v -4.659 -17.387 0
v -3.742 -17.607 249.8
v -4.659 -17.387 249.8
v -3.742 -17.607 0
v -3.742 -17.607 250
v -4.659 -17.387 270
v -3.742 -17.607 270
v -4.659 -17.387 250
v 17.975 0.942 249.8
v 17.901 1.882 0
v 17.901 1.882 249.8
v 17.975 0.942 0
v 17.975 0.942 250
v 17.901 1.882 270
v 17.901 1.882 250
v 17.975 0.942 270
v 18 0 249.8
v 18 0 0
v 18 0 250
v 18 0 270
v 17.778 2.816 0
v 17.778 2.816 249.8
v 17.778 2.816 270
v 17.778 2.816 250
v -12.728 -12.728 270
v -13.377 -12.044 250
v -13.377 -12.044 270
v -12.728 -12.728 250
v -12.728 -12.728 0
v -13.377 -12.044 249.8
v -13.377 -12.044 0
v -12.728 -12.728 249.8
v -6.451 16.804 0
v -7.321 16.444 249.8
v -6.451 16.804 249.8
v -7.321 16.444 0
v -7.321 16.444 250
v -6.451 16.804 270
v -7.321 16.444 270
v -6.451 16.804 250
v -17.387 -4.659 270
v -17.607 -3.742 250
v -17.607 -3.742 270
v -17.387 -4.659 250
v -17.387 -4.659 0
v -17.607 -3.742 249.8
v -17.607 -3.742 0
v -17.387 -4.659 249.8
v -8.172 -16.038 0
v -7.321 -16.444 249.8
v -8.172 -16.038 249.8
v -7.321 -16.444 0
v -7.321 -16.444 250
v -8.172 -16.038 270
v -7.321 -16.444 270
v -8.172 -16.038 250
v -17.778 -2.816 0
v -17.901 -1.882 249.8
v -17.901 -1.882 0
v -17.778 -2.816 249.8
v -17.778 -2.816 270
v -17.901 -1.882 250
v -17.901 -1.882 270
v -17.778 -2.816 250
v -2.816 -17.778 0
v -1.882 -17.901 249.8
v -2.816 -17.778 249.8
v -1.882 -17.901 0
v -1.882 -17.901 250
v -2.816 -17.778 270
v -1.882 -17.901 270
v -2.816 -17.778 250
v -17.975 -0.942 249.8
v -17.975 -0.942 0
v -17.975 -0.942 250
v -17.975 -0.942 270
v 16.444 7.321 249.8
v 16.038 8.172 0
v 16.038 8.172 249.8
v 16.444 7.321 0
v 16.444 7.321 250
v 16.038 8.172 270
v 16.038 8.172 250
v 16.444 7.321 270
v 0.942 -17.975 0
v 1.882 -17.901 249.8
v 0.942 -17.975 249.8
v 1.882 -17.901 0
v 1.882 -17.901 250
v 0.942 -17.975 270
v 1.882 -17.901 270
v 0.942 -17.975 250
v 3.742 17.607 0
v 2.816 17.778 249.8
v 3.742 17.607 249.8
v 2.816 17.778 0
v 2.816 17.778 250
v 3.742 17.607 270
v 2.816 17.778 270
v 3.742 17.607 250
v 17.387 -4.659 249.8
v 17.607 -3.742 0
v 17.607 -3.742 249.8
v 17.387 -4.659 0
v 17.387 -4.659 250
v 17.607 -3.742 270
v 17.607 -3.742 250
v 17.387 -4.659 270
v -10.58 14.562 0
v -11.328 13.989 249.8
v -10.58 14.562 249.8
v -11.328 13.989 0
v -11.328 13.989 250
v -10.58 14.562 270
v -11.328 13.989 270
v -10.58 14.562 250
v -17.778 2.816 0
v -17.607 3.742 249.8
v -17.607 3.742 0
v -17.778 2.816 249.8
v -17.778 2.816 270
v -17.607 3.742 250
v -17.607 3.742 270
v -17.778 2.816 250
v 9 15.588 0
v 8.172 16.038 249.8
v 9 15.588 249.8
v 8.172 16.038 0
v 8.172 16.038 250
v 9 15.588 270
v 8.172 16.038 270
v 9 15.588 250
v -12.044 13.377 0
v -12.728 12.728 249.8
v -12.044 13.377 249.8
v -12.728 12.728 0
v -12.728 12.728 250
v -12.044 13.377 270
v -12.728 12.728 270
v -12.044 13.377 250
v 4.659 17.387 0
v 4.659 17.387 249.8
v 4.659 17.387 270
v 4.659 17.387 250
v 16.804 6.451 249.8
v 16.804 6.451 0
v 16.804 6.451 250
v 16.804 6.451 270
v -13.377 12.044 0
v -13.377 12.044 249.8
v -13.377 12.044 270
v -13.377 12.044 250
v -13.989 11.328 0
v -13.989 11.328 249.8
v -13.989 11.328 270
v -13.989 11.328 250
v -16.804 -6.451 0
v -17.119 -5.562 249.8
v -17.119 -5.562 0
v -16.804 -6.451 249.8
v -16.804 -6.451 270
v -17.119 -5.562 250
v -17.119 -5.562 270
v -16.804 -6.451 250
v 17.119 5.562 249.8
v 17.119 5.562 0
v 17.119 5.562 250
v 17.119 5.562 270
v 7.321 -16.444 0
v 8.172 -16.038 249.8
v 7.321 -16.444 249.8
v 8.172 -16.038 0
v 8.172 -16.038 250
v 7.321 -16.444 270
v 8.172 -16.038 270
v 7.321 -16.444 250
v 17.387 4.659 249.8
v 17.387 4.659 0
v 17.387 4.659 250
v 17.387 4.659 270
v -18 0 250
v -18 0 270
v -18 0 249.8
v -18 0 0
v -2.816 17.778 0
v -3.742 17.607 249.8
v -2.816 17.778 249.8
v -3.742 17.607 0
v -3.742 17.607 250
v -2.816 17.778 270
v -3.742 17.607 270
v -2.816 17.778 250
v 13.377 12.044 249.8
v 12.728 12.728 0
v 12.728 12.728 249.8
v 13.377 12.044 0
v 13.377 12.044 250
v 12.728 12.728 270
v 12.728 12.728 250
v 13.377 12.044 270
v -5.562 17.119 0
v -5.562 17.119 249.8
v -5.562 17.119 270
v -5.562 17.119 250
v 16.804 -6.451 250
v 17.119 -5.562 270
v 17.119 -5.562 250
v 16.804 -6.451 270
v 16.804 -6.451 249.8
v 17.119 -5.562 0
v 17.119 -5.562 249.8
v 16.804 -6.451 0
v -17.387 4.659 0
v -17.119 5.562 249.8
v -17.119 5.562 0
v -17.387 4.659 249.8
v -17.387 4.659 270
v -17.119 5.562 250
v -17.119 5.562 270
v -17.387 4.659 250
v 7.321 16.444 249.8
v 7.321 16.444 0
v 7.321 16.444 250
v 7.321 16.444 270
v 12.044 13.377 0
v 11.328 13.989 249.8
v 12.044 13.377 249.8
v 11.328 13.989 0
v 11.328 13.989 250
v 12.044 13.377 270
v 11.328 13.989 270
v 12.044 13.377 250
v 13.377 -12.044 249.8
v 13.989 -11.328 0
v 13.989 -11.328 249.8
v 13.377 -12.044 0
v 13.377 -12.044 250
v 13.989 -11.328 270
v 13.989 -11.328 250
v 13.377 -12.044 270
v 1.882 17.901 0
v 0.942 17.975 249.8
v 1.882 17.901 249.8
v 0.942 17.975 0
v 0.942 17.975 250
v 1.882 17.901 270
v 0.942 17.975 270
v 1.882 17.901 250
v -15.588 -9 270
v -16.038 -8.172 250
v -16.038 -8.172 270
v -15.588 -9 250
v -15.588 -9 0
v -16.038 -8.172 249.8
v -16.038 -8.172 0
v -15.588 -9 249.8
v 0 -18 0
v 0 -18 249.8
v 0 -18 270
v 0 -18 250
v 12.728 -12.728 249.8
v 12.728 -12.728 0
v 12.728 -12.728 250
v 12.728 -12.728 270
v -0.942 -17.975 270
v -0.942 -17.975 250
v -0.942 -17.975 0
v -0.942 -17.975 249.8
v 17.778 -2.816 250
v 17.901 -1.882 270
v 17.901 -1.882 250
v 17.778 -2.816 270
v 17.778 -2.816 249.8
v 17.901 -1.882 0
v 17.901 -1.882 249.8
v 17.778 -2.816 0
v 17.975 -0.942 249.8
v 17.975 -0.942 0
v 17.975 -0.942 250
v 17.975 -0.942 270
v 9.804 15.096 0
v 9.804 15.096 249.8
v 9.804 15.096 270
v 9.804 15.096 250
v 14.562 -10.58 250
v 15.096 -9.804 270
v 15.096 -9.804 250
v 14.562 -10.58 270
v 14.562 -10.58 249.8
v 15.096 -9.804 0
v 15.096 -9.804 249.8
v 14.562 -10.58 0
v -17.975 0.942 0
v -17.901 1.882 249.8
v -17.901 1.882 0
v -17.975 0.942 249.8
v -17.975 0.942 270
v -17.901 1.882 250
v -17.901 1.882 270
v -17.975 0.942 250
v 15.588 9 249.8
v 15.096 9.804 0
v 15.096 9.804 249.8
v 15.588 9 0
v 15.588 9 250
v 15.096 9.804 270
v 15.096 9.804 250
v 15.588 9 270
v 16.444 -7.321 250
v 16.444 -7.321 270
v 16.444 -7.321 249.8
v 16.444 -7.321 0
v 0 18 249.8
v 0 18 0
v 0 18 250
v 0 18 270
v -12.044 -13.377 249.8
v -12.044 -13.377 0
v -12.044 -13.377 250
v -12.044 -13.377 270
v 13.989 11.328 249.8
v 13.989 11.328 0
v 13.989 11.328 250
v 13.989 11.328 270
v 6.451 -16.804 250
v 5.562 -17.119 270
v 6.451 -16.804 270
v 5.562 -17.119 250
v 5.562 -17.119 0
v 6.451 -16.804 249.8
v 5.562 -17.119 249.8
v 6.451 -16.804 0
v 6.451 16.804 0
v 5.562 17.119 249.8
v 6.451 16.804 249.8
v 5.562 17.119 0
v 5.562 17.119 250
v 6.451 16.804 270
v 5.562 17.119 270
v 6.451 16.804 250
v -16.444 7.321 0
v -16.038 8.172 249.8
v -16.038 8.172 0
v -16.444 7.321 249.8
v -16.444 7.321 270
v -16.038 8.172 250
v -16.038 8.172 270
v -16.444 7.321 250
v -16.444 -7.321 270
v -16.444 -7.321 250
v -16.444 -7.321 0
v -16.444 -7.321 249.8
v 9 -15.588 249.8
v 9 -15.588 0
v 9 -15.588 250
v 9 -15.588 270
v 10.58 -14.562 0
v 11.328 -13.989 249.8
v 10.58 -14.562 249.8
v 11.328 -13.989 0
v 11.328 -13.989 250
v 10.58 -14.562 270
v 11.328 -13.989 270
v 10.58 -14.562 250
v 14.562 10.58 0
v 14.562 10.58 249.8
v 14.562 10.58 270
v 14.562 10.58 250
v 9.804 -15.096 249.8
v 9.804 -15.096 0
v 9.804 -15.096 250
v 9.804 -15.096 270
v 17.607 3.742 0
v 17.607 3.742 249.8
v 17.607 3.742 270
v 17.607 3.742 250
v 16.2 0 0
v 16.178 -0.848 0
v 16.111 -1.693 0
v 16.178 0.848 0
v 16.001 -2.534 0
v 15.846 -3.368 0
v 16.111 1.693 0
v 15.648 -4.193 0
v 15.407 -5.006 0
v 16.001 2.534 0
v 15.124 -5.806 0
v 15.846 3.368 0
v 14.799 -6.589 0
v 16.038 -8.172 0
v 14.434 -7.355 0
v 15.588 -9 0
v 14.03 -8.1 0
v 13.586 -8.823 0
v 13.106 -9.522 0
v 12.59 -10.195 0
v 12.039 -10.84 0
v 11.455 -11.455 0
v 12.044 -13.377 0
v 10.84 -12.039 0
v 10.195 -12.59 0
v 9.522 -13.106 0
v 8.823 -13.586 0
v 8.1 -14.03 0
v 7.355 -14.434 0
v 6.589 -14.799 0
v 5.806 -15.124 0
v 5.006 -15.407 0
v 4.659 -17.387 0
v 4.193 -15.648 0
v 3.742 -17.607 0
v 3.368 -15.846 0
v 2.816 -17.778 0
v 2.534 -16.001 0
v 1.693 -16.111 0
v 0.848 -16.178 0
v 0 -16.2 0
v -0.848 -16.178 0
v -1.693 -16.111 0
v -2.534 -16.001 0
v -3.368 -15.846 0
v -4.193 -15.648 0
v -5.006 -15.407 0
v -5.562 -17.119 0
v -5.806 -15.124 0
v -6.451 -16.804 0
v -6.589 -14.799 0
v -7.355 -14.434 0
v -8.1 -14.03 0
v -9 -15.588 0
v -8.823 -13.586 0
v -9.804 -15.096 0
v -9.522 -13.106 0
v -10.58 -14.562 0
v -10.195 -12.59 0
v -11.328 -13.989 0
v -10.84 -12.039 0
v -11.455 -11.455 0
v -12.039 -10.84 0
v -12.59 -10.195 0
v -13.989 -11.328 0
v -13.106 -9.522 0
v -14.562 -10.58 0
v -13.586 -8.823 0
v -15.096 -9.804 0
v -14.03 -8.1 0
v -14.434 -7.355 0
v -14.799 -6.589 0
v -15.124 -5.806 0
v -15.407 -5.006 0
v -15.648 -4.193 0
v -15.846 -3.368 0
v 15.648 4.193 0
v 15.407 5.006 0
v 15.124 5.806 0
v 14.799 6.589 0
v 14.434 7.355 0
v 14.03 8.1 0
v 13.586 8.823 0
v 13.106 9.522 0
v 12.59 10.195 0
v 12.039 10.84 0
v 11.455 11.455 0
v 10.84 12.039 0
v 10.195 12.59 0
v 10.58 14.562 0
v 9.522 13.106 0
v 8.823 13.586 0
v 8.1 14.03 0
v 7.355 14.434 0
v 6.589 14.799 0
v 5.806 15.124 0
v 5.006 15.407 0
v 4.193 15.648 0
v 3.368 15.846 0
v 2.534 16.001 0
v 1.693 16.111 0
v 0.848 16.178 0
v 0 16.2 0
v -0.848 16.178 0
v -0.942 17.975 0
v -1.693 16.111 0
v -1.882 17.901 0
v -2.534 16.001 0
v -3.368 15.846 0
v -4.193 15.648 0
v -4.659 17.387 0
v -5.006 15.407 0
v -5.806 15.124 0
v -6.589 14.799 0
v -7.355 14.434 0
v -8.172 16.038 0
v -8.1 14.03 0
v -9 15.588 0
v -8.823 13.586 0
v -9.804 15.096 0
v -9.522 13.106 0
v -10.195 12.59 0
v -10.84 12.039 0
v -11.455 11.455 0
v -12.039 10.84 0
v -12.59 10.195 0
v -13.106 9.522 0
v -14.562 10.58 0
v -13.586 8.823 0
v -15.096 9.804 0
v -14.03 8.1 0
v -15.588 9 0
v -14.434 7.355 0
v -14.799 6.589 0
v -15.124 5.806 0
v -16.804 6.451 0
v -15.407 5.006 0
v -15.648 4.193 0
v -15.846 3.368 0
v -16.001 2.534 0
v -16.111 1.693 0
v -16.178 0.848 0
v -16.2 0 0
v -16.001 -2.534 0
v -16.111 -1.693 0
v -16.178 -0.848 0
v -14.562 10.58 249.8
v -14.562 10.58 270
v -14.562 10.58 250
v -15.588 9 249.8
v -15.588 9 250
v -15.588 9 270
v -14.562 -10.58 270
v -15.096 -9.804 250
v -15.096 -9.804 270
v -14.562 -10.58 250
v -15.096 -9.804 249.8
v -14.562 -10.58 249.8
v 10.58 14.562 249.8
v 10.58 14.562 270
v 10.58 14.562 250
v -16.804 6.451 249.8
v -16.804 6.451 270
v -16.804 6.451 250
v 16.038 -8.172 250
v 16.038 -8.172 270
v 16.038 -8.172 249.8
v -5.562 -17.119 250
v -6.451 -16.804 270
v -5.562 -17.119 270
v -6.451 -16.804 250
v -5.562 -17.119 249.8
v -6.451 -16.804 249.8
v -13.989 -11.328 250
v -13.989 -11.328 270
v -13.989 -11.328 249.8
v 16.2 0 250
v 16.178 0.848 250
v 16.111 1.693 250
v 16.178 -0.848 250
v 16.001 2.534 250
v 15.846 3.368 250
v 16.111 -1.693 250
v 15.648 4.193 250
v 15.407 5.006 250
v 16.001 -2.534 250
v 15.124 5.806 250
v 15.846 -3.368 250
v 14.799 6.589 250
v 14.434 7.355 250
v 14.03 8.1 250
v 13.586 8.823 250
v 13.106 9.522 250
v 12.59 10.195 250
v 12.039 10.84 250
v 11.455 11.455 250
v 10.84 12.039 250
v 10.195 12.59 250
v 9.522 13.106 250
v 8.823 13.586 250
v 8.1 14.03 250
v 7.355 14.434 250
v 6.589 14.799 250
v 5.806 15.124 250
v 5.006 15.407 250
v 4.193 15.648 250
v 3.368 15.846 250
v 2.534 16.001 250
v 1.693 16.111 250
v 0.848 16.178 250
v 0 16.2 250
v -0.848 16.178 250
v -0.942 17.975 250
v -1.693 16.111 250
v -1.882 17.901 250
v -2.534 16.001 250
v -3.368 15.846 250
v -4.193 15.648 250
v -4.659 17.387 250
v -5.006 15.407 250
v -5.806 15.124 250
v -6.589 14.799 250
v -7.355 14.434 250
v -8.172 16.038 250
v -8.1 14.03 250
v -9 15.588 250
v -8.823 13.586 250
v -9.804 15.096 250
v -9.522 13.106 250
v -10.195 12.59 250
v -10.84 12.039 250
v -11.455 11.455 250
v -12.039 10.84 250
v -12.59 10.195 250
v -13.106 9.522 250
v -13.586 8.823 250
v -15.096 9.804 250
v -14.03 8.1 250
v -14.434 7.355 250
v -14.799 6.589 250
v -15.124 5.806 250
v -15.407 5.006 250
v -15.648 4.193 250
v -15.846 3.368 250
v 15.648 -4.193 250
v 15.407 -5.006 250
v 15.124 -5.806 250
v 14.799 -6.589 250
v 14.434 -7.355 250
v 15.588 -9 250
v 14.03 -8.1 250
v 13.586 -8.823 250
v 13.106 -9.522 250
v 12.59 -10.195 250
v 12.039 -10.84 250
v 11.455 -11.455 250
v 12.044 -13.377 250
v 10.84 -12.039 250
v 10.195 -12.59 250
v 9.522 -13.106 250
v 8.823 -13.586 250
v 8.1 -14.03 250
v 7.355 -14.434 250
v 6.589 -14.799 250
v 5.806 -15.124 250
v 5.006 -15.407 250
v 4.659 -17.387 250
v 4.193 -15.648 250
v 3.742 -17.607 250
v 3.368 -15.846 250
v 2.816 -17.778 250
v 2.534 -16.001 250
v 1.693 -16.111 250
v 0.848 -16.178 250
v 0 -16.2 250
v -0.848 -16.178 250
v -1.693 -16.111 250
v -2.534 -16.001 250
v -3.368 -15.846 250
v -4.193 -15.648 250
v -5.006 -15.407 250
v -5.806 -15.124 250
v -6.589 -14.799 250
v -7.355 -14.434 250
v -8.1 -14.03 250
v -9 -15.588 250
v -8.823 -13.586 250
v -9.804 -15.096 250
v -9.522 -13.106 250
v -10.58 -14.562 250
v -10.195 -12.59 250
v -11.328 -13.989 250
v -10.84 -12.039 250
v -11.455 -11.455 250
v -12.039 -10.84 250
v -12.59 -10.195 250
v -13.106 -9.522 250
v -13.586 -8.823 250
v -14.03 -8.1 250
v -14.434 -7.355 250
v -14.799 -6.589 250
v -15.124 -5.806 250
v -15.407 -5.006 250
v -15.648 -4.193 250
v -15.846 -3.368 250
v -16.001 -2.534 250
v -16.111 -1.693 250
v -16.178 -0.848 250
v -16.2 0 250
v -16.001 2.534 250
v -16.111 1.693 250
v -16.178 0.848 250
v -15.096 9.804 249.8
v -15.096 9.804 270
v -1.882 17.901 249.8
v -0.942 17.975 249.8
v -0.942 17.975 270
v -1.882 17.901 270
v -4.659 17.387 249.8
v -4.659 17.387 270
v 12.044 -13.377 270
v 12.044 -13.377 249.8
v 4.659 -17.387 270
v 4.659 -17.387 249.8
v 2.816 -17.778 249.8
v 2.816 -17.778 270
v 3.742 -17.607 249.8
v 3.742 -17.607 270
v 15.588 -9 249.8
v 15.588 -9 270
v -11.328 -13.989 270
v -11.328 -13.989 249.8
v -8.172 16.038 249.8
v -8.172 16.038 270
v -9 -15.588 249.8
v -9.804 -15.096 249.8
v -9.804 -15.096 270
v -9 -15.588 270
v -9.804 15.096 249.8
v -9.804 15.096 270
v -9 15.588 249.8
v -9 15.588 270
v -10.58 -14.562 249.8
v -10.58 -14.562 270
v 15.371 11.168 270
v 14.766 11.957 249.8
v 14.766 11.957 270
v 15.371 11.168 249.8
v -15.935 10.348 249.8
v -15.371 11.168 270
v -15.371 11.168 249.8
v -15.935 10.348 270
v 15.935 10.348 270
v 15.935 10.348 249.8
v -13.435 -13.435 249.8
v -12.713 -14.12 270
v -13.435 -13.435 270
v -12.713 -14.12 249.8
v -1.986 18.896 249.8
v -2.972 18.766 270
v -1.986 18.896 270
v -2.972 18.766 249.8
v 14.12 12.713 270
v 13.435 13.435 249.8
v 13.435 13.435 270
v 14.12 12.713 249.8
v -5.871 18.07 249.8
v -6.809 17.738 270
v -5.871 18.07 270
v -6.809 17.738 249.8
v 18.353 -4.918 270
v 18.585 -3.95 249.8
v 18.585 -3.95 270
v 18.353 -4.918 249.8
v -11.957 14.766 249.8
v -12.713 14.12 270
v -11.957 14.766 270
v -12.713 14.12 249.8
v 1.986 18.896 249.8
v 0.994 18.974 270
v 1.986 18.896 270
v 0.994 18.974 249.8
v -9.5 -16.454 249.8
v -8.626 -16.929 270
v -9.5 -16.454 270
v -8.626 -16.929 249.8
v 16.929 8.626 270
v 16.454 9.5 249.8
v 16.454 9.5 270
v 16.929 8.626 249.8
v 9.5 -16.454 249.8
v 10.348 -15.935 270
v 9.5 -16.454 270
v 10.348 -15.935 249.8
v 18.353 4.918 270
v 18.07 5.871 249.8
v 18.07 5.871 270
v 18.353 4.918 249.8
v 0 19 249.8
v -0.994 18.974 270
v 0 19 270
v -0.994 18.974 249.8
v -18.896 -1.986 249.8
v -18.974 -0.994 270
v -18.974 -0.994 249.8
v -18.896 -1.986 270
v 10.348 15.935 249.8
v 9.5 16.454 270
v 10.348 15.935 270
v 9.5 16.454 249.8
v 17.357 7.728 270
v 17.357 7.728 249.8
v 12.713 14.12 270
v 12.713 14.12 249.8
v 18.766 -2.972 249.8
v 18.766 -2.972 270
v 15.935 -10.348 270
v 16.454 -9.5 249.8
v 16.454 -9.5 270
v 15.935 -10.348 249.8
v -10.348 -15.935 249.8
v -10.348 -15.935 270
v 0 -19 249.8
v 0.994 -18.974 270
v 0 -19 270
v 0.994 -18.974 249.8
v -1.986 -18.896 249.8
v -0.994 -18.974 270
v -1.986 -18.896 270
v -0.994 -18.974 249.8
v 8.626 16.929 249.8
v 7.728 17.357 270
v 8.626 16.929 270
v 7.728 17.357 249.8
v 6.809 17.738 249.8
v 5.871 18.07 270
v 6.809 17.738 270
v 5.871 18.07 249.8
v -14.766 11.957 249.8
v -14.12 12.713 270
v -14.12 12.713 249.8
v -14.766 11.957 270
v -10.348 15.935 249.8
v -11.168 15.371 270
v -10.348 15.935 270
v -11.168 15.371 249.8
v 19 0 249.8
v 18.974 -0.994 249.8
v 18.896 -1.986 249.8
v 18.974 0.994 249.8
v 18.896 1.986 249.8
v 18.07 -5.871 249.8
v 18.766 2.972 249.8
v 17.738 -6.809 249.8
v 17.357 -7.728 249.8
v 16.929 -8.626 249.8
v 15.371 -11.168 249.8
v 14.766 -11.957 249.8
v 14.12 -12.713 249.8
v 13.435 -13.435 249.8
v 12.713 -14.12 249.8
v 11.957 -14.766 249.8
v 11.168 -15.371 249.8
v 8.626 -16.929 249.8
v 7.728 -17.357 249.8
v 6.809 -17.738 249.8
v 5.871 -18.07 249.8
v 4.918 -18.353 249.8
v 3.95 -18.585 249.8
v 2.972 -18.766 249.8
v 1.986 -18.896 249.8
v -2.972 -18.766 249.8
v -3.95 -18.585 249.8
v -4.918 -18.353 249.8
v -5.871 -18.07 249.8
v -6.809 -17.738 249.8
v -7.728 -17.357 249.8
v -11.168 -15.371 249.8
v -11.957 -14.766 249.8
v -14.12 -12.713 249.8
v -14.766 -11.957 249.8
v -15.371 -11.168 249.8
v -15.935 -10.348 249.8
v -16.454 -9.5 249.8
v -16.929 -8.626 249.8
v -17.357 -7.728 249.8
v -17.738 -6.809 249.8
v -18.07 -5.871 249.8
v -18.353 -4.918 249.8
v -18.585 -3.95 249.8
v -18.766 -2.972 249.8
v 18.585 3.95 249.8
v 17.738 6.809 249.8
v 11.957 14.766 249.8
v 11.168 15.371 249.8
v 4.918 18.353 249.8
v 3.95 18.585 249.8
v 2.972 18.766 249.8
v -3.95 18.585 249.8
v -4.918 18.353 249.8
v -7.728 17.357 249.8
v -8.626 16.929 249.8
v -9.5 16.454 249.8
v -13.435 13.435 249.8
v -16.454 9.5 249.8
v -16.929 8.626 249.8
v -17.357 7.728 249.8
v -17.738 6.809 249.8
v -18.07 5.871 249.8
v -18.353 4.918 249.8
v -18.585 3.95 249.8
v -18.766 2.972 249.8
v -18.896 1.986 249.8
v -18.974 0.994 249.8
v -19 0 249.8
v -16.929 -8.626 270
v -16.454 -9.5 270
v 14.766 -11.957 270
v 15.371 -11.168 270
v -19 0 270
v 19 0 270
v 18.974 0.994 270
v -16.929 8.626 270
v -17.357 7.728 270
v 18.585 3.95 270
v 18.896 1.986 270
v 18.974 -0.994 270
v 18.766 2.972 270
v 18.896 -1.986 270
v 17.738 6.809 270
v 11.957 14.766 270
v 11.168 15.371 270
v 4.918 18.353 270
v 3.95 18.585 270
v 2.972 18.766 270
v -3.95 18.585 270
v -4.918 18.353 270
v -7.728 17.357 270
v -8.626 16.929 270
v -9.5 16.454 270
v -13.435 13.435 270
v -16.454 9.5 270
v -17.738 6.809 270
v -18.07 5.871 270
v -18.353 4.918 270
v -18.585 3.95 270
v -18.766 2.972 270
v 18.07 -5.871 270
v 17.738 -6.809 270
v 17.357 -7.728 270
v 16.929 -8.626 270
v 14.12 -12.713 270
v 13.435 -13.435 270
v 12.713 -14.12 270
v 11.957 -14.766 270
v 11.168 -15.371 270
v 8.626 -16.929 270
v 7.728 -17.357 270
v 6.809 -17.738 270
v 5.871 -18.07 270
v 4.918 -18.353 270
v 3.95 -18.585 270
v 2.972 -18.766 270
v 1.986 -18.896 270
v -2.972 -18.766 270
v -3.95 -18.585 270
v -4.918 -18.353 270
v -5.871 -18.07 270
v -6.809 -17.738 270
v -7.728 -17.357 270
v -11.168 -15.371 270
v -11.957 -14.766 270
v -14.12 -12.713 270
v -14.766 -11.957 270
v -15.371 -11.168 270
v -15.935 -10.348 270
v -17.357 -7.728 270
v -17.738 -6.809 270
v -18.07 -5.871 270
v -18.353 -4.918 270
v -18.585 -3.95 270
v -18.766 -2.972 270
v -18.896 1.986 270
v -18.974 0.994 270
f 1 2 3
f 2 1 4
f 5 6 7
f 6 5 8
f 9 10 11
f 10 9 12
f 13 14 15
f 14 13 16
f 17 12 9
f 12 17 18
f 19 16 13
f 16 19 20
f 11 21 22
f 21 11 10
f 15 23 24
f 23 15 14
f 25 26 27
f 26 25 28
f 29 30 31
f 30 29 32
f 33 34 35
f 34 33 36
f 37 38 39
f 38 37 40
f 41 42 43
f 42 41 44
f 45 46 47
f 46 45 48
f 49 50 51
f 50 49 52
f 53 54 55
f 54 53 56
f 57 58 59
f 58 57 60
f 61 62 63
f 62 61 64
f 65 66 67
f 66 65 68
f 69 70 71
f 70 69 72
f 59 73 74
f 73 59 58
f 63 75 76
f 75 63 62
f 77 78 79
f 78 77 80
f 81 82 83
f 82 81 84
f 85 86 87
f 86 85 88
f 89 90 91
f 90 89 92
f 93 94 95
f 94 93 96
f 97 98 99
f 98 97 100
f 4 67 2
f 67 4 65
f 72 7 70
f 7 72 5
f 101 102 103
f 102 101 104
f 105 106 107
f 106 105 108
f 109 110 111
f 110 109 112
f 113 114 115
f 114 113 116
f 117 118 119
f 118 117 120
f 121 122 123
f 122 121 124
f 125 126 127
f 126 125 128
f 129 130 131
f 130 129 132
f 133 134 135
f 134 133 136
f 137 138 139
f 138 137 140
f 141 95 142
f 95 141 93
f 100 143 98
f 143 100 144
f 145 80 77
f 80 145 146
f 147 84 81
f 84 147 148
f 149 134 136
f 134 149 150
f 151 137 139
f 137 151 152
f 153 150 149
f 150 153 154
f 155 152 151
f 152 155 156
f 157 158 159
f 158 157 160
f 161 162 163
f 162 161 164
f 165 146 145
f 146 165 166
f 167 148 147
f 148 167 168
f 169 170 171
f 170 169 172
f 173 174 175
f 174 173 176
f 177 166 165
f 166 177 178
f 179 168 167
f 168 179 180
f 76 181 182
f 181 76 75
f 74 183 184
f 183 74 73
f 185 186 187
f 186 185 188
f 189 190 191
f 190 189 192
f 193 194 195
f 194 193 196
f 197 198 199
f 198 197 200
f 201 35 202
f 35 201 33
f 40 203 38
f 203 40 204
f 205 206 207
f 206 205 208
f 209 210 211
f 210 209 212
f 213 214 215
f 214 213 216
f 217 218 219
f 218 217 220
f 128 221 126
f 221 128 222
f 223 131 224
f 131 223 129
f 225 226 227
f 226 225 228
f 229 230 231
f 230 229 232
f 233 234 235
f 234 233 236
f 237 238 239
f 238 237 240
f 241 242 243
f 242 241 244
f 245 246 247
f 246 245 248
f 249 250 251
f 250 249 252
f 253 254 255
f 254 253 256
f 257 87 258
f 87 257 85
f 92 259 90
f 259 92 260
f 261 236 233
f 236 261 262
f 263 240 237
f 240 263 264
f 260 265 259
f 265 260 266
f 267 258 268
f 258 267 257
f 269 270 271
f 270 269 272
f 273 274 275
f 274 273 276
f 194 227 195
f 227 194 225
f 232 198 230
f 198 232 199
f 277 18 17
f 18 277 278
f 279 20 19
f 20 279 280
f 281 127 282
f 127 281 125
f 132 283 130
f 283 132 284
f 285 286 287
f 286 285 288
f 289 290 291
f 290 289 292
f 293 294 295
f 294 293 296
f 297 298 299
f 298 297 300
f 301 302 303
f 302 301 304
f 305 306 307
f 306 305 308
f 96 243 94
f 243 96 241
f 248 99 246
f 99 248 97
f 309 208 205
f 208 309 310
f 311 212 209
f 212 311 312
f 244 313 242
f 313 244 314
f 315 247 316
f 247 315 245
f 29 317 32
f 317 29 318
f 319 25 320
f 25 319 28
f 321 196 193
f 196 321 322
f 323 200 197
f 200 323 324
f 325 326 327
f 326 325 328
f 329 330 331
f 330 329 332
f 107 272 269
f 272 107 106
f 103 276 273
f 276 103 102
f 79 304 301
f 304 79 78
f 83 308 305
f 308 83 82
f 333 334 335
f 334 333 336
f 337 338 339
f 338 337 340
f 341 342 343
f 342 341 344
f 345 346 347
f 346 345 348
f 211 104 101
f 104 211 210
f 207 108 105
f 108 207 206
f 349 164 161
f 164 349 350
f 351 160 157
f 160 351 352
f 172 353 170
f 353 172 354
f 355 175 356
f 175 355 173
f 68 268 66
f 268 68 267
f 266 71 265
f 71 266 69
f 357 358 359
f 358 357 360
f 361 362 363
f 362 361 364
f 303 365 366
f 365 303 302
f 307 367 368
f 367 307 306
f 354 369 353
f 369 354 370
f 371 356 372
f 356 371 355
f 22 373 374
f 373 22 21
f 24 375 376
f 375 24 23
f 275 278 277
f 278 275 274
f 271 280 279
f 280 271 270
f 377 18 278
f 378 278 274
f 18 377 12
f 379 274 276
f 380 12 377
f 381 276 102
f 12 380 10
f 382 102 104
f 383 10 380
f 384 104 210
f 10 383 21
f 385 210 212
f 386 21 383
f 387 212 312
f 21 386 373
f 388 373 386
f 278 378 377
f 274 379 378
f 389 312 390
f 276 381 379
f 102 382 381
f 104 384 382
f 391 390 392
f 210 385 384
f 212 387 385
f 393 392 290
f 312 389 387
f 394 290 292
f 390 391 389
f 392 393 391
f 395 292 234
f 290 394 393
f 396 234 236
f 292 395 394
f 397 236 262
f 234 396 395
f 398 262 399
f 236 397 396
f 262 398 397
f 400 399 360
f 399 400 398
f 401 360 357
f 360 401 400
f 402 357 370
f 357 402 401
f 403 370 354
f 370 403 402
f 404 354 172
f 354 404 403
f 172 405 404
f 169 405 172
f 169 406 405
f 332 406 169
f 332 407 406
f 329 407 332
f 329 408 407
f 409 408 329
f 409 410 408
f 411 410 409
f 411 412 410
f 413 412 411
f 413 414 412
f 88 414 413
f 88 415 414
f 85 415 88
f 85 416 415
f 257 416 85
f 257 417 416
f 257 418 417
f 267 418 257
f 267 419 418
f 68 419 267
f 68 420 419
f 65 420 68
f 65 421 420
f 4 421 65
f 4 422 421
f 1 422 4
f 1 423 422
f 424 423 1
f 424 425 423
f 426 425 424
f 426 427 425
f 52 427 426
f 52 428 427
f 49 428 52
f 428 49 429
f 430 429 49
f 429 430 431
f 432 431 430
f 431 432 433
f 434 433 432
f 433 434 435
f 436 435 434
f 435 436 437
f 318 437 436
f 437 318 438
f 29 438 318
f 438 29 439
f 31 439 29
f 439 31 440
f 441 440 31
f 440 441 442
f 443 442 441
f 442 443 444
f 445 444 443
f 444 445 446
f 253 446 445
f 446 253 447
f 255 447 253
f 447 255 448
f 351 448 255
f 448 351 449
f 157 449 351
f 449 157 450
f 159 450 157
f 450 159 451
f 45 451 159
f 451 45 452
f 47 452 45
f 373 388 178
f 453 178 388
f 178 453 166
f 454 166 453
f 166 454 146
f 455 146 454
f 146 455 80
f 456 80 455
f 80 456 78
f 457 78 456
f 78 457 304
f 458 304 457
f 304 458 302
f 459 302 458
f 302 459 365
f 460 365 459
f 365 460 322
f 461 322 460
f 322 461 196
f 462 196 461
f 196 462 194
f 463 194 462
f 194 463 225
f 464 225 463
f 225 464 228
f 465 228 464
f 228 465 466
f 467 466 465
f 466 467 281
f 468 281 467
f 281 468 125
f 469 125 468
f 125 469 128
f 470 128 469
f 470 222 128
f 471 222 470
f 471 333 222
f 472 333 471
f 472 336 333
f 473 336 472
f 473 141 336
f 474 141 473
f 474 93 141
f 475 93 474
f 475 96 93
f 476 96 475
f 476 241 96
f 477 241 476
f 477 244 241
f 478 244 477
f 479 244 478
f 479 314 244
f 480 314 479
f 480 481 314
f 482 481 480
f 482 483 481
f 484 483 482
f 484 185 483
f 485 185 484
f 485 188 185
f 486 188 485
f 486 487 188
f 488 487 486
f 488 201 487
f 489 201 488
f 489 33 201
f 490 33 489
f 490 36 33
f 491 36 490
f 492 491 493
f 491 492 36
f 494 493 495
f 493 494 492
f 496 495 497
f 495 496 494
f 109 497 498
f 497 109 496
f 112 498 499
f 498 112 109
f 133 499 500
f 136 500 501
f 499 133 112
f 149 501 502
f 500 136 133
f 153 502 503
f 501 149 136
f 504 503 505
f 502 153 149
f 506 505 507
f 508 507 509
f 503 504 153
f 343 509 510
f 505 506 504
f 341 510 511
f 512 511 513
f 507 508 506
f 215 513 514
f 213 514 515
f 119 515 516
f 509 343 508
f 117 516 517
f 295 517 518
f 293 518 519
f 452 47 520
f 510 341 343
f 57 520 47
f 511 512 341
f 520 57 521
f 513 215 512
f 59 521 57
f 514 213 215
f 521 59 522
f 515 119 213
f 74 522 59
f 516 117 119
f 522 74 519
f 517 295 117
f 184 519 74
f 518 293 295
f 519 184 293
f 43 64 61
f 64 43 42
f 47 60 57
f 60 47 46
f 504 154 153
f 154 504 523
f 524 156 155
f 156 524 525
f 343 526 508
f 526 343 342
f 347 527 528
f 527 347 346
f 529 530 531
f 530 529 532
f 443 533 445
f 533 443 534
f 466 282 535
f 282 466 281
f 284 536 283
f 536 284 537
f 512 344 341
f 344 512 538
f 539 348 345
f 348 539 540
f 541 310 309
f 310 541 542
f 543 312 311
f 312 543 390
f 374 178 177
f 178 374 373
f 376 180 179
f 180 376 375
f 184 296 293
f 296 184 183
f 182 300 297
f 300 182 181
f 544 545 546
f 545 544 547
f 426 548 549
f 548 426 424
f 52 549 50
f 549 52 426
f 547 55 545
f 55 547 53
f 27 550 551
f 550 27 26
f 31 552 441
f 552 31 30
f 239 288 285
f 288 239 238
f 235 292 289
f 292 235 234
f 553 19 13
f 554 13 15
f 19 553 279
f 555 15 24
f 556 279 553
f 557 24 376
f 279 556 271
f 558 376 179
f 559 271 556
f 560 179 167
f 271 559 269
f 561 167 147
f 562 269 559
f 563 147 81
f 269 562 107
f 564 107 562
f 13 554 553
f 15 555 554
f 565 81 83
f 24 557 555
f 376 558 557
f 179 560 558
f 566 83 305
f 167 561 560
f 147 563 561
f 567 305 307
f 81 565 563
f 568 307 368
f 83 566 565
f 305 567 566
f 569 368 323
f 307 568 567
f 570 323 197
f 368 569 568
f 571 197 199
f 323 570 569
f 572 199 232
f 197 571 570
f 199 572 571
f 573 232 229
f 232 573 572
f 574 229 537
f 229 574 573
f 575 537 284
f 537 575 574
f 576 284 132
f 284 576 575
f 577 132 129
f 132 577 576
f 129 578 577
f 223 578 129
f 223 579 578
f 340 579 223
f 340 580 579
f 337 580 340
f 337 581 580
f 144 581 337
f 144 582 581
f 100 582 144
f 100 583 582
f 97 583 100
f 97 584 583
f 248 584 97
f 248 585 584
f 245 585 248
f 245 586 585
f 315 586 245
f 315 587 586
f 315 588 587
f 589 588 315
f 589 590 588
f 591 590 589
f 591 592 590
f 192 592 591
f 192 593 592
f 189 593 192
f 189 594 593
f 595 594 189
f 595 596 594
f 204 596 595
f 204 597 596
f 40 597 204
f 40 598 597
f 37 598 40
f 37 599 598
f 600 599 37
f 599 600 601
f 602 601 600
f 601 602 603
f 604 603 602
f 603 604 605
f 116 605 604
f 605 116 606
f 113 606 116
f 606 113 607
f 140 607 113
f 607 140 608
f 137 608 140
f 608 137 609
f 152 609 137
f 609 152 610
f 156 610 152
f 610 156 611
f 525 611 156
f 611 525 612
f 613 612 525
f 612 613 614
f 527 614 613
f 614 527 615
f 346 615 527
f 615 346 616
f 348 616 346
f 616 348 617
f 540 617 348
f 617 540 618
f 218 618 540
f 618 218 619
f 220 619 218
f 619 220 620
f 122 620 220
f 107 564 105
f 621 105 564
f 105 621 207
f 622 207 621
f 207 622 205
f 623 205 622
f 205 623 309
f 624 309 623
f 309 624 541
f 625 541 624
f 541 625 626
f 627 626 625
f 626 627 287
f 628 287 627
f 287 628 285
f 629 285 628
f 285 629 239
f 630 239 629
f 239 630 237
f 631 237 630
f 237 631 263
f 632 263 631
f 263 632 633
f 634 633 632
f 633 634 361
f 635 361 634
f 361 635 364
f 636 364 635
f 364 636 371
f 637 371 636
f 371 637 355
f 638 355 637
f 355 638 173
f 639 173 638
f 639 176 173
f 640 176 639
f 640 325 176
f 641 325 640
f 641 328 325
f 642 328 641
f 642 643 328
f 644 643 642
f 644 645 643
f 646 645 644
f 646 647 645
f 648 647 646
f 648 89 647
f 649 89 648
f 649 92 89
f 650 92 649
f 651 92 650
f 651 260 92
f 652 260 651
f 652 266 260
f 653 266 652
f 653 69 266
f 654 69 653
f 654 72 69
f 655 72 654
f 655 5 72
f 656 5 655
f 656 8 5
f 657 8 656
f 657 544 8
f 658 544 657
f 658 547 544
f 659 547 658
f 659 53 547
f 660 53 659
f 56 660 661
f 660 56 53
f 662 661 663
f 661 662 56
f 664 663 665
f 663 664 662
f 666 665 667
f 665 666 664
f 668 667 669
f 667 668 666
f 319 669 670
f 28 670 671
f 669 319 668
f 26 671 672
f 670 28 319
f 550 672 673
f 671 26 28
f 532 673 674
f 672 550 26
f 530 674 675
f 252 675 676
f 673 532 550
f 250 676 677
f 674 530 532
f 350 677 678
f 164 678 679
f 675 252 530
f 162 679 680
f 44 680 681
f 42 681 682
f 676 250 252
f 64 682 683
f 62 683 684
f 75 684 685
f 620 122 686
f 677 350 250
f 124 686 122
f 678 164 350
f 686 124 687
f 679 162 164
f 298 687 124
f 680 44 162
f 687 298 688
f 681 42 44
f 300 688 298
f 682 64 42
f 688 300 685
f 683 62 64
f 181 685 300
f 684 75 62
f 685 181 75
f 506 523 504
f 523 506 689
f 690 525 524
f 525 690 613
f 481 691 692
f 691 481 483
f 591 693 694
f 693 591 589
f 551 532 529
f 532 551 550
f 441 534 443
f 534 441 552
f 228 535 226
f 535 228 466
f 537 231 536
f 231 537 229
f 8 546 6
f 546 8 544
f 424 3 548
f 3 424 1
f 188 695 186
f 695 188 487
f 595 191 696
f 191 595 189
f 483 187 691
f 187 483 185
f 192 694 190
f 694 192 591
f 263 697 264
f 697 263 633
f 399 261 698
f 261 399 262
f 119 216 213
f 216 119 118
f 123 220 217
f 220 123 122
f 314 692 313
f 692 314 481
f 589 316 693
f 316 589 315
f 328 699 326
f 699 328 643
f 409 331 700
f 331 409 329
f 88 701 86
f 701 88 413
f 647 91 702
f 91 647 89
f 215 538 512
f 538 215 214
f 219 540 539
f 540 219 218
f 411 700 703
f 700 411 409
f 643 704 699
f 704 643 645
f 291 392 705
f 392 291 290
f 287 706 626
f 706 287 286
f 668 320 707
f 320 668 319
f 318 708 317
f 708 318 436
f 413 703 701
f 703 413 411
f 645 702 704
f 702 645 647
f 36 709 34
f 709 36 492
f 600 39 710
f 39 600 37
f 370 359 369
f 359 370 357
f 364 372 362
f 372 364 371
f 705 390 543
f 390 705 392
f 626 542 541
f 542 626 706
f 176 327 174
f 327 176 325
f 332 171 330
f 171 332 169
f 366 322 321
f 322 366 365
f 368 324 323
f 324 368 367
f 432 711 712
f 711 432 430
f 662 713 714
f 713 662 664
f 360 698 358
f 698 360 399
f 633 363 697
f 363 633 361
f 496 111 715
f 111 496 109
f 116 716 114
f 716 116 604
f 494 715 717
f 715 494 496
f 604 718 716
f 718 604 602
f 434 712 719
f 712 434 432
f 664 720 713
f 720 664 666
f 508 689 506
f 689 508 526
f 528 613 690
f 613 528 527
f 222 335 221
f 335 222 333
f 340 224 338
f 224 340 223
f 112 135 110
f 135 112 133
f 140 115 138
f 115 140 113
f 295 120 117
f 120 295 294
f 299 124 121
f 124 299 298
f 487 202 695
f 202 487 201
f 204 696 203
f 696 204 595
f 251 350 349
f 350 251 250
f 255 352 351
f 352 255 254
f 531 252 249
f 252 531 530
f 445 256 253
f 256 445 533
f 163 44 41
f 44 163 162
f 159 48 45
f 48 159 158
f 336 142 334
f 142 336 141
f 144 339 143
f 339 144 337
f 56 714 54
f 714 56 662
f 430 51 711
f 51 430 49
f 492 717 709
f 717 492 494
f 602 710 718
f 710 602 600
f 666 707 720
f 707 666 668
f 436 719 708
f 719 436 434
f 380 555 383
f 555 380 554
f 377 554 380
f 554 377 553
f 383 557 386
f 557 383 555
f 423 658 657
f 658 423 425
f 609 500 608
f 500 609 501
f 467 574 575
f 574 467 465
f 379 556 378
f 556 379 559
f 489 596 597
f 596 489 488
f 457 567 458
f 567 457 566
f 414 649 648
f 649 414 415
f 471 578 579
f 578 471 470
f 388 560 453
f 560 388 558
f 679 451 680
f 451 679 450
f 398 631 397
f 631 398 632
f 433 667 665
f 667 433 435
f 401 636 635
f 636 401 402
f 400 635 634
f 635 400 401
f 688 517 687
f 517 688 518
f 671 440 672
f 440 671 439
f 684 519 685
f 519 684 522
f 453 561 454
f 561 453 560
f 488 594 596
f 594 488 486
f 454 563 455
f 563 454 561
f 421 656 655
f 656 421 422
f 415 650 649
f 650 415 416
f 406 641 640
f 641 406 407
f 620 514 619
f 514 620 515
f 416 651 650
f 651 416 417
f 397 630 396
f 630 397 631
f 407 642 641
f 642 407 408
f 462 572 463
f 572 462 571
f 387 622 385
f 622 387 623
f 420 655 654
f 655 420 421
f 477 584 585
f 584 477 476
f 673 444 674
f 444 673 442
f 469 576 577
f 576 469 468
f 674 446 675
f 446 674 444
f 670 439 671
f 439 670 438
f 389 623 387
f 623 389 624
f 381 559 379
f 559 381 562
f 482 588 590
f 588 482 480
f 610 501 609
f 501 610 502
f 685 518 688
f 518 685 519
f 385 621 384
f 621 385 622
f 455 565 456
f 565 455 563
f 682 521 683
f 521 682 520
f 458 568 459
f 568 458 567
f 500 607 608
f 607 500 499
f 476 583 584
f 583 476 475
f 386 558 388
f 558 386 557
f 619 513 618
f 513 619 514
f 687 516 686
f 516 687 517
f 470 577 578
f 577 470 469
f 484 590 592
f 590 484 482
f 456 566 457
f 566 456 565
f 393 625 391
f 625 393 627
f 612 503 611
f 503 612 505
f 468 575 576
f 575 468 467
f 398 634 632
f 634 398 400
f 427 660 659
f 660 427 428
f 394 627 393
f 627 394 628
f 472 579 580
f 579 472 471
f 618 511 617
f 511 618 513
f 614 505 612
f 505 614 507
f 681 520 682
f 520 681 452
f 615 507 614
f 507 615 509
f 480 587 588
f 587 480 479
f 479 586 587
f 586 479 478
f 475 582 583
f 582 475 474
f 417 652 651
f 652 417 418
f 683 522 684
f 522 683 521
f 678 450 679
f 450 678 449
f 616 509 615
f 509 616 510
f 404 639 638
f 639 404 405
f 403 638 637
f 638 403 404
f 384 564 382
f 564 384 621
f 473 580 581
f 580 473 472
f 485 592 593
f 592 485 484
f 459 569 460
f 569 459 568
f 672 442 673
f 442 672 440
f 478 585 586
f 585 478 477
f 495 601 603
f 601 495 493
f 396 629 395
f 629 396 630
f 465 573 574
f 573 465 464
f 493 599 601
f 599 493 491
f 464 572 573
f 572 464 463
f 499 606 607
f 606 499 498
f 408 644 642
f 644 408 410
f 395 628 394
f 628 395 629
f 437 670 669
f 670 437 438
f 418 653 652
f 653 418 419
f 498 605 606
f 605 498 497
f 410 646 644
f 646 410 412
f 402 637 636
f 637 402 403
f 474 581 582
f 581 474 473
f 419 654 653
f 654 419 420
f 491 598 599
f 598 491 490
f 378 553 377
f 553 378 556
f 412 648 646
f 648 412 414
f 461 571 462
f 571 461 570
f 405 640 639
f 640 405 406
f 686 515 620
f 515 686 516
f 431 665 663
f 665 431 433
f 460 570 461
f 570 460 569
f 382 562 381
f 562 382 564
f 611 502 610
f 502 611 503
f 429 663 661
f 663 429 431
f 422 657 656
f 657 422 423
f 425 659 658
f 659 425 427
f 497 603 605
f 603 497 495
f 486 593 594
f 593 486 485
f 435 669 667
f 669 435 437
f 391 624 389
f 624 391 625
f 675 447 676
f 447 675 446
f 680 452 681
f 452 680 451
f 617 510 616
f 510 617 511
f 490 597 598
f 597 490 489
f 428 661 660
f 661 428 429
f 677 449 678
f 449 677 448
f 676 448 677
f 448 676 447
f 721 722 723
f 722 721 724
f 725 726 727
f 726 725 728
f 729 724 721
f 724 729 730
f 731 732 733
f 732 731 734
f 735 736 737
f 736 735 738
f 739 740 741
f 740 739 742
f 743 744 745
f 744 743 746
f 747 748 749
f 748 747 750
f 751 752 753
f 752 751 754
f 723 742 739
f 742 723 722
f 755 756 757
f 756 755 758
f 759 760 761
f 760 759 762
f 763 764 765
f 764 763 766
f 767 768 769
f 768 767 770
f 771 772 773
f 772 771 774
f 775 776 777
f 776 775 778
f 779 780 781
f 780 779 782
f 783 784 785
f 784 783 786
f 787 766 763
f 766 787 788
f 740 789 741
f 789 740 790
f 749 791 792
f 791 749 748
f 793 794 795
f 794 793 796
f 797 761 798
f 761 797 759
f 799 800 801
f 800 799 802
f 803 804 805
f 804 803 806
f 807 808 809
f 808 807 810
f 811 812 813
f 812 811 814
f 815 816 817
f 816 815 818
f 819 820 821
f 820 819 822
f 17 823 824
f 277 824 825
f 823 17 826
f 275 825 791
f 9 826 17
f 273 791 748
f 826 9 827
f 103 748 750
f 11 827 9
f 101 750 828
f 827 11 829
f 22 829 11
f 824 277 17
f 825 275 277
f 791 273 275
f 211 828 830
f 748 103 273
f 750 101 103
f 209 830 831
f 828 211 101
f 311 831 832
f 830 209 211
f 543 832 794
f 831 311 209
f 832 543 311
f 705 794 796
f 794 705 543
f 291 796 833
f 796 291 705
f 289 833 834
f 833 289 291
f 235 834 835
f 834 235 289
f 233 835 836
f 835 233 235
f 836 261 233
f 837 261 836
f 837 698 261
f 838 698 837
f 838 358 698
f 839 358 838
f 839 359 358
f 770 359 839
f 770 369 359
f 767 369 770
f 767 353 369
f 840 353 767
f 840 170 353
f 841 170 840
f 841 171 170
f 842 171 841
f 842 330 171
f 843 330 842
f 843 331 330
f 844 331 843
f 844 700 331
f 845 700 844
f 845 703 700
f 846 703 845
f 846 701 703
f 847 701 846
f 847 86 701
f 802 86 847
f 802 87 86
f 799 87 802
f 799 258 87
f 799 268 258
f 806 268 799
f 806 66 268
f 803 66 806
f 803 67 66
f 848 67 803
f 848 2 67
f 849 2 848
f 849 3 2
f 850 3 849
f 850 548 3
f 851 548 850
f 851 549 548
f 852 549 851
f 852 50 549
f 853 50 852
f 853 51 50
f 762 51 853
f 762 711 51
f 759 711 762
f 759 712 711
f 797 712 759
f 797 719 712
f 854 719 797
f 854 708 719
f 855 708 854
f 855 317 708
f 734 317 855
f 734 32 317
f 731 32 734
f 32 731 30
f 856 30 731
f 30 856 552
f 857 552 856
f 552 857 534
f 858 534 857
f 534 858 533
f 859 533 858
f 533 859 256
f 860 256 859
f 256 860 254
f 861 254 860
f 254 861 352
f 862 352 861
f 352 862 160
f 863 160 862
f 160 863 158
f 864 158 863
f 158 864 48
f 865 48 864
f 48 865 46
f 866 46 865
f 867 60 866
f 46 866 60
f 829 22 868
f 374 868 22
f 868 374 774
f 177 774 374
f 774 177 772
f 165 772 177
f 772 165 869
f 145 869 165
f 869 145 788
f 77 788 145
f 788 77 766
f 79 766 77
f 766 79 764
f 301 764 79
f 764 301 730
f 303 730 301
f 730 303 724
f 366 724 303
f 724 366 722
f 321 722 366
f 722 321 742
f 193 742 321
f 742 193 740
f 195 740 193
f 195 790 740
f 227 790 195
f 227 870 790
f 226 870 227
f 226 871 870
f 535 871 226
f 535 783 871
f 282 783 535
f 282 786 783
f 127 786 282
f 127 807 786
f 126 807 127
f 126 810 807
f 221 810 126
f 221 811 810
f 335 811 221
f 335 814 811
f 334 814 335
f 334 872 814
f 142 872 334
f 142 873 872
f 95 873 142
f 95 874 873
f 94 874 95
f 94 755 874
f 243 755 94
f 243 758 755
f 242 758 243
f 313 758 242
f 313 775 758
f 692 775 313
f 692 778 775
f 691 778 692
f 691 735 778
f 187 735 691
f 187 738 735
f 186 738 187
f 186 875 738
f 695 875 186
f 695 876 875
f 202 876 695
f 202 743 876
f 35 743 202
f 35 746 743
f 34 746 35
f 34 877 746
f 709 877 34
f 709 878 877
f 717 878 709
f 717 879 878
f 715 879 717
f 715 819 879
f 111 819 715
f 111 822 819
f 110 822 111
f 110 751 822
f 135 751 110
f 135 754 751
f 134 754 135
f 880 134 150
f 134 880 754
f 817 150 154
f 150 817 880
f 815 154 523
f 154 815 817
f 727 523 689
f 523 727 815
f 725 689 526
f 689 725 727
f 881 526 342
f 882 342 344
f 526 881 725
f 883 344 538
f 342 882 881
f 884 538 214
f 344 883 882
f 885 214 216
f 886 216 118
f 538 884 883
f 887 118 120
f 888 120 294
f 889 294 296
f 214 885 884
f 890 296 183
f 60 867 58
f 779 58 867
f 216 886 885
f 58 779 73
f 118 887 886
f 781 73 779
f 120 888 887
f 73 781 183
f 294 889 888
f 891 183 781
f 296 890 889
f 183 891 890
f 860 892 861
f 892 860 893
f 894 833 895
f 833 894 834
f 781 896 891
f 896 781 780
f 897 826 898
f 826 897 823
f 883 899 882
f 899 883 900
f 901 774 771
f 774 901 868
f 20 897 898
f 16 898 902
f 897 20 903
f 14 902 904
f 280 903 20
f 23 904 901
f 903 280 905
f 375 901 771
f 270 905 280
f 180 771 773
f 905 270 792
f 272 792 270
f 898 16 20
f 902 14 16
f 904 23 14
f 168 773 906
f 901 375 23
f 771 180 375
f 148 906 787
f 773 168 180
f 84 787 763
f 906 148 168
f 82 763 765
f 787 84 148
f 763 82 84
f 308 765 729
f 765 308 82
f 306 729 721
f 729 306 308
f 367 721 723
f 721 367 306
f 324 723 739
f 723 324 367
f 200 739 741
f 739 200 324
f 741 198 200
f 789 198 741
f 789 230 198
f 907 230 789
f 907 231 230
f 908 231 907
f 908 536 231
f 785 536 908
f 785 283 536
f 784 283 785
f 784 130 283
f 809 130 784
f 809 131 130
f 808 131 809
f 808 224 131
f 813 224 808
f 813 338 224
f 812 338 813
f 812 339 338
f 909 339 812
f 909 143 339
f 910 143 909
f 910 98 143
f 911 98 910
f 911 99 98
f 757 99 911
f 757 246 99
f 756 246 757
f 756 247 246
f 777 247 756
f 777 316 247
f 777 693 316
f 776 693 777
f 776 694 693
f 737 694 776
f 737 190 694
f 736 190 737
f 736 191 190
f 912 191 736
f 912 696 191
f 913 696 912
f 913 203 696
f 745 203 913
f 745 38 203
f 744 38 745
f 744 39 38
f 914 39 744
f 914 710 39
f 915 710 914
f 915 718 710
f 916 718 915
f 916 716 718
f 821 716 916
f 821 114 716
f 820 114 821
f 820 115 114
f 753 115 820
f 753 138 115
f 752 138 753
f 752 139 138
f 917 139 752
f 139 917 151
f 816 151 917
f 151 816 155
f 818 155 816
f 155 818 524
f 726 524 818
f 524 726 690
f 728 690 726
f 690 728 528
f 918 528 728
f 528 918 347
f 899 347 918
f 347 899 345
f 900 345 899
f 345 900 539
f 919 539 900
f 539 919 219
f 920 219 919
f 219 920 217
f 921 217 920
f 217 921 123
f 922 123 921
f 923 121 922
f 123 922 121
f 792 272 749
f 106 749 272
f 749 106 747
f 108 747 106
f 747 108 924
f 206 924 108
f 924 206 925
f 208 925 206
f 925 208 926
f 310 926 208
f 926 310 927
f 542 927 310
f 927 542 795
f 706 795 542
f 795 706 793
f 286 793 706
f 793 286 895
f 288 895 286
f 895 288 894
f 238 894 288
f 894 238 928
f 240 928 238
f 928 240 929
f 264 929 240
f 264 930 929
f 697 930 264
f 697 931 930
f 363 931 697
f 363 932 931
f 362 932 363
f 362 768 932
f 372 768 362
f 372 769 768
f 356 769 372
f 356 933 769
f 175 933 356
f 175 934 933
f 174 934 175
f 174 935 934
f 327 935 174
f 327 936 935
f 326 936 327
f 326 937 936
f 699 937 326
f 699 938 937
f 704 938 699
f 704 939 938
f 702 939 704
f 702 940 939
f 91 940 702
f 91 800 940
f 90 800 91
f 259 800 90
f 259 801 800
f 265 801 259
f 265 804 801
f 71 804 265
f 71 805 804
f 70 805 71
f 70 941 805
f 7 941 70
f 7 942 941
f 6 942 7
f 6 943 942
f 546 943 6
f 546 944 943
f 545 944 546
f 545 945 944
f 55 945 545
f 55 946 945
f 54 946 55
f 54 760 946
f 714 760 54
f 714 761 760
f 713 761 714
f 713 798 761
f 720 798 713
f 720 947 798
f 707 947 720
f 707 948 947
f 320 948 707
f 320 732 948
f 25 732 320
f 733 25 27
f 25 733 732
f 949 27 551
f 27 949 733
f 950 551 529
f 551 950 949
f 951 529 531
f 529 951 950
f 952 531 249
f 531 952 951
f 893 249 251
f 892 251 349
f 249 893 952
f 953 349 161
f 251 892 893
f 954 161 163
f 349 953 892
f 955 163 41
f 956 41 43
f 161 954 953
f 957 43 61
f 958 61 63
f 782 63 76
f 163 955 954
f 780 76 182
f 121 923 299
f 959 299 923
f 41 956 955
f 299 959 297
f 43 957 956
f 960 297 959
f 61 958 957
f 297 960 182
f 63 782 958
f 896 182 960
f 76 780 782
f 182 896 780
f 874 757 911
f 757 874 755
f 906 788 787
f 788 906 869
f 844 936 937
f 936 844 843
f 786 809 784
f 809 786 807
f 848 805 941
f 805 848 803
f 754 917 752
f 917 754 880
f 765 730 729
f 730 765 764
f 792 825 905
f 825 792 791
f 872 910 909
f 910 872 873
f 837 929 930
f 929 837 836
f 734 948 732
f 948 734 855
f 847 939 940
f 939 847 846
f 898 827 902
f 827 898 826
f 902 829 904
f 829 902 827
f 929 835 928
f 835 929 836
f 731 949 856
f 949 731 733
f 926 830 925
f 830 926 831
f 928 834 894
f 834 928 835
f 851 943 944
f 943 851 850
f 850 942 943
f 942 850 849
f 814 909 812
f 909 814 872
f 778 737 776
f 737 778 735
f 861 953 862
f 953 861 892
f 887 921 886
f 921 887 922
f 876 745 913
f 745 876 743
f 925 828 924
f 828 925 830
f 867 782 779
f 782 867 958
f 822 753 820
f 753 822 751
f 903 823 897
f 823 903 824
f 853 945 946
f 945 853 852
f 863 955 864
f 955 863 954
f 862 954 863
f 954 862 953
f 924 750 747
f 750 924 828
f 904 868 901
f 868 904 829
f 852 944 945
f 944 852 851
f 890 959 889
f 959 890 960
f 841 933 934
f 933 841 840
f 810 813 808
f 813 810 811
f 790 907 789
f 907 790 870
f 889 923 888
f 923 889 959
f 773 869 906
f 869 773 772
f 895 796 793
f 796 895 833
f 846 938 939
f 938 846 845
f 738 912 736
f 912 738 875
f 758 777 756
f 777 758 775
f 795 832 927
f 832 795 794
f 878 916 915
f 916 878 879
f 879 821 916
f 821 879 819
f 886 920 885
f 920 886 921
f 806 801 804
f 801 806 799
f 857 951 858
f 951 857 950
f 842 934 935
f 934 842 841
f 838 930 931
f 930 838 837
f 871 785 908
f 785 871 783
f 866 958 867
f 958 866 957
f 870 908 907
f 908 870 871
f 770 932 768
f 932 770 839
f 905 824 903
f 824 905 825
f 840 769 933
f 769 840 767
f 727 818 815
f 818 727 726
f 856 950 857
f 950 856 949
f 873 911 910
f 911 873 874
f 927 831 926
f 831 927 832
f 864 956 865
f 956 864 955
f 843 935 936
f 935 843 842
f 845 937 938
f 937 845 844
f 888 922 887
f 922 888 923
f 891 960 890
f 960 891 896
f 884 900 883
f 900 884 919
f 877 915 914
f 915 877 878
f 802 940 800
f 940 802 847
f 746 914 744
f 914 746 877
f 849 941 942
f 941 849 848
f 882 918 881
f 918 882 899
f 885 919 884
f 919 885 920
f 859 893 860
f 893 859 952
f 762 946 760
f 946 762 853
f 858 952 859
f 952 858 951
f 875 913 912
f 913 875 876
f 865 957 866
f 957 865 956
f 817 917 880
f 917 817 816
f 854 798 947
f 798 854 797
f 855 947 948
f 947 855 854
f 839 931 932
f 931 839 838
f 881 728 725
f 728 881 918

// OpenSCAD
// HT 32 pipe 250 mm (single connected solid)

$fn = 120;

// Dimensions (mm)
outer_diameter   = 36.0;  // pipe OD
wall_thickness   = 1.8;   // pipe wall
length           = 250.0; // overall length
socket_length    = 20.0;  // socket axial length
socket_diameter  = 38.0;  // socket OD

// Robustness / connectivity
eps = 0.2; // small overlap to guarantee union connectivity and clean booleans

inner_diameter = outer_diameter - 2*wall_thickness;

module tube(h, od, id) {
    difference() {
        cylinder(h=h, d=od, center=false);
        translate([0, 0, -eps])
            cylinder(h=h + 2*eps, d=id, center=false);
    }
}

module ht_pipe() {
    union() {
        // Main pipe body (hollow)
        tube(length, outer_diameter, inner_diameter);

        // Socket at one end (hollow), overlapped into body for a single connected solid
        // Place socket so it extends beyond the end while overlapping by eps
        translate([0, 0, length - eps])
            tube(socket_length + eps, socket_diameter, outer_diameter);
    }
}

ht_pipe();
